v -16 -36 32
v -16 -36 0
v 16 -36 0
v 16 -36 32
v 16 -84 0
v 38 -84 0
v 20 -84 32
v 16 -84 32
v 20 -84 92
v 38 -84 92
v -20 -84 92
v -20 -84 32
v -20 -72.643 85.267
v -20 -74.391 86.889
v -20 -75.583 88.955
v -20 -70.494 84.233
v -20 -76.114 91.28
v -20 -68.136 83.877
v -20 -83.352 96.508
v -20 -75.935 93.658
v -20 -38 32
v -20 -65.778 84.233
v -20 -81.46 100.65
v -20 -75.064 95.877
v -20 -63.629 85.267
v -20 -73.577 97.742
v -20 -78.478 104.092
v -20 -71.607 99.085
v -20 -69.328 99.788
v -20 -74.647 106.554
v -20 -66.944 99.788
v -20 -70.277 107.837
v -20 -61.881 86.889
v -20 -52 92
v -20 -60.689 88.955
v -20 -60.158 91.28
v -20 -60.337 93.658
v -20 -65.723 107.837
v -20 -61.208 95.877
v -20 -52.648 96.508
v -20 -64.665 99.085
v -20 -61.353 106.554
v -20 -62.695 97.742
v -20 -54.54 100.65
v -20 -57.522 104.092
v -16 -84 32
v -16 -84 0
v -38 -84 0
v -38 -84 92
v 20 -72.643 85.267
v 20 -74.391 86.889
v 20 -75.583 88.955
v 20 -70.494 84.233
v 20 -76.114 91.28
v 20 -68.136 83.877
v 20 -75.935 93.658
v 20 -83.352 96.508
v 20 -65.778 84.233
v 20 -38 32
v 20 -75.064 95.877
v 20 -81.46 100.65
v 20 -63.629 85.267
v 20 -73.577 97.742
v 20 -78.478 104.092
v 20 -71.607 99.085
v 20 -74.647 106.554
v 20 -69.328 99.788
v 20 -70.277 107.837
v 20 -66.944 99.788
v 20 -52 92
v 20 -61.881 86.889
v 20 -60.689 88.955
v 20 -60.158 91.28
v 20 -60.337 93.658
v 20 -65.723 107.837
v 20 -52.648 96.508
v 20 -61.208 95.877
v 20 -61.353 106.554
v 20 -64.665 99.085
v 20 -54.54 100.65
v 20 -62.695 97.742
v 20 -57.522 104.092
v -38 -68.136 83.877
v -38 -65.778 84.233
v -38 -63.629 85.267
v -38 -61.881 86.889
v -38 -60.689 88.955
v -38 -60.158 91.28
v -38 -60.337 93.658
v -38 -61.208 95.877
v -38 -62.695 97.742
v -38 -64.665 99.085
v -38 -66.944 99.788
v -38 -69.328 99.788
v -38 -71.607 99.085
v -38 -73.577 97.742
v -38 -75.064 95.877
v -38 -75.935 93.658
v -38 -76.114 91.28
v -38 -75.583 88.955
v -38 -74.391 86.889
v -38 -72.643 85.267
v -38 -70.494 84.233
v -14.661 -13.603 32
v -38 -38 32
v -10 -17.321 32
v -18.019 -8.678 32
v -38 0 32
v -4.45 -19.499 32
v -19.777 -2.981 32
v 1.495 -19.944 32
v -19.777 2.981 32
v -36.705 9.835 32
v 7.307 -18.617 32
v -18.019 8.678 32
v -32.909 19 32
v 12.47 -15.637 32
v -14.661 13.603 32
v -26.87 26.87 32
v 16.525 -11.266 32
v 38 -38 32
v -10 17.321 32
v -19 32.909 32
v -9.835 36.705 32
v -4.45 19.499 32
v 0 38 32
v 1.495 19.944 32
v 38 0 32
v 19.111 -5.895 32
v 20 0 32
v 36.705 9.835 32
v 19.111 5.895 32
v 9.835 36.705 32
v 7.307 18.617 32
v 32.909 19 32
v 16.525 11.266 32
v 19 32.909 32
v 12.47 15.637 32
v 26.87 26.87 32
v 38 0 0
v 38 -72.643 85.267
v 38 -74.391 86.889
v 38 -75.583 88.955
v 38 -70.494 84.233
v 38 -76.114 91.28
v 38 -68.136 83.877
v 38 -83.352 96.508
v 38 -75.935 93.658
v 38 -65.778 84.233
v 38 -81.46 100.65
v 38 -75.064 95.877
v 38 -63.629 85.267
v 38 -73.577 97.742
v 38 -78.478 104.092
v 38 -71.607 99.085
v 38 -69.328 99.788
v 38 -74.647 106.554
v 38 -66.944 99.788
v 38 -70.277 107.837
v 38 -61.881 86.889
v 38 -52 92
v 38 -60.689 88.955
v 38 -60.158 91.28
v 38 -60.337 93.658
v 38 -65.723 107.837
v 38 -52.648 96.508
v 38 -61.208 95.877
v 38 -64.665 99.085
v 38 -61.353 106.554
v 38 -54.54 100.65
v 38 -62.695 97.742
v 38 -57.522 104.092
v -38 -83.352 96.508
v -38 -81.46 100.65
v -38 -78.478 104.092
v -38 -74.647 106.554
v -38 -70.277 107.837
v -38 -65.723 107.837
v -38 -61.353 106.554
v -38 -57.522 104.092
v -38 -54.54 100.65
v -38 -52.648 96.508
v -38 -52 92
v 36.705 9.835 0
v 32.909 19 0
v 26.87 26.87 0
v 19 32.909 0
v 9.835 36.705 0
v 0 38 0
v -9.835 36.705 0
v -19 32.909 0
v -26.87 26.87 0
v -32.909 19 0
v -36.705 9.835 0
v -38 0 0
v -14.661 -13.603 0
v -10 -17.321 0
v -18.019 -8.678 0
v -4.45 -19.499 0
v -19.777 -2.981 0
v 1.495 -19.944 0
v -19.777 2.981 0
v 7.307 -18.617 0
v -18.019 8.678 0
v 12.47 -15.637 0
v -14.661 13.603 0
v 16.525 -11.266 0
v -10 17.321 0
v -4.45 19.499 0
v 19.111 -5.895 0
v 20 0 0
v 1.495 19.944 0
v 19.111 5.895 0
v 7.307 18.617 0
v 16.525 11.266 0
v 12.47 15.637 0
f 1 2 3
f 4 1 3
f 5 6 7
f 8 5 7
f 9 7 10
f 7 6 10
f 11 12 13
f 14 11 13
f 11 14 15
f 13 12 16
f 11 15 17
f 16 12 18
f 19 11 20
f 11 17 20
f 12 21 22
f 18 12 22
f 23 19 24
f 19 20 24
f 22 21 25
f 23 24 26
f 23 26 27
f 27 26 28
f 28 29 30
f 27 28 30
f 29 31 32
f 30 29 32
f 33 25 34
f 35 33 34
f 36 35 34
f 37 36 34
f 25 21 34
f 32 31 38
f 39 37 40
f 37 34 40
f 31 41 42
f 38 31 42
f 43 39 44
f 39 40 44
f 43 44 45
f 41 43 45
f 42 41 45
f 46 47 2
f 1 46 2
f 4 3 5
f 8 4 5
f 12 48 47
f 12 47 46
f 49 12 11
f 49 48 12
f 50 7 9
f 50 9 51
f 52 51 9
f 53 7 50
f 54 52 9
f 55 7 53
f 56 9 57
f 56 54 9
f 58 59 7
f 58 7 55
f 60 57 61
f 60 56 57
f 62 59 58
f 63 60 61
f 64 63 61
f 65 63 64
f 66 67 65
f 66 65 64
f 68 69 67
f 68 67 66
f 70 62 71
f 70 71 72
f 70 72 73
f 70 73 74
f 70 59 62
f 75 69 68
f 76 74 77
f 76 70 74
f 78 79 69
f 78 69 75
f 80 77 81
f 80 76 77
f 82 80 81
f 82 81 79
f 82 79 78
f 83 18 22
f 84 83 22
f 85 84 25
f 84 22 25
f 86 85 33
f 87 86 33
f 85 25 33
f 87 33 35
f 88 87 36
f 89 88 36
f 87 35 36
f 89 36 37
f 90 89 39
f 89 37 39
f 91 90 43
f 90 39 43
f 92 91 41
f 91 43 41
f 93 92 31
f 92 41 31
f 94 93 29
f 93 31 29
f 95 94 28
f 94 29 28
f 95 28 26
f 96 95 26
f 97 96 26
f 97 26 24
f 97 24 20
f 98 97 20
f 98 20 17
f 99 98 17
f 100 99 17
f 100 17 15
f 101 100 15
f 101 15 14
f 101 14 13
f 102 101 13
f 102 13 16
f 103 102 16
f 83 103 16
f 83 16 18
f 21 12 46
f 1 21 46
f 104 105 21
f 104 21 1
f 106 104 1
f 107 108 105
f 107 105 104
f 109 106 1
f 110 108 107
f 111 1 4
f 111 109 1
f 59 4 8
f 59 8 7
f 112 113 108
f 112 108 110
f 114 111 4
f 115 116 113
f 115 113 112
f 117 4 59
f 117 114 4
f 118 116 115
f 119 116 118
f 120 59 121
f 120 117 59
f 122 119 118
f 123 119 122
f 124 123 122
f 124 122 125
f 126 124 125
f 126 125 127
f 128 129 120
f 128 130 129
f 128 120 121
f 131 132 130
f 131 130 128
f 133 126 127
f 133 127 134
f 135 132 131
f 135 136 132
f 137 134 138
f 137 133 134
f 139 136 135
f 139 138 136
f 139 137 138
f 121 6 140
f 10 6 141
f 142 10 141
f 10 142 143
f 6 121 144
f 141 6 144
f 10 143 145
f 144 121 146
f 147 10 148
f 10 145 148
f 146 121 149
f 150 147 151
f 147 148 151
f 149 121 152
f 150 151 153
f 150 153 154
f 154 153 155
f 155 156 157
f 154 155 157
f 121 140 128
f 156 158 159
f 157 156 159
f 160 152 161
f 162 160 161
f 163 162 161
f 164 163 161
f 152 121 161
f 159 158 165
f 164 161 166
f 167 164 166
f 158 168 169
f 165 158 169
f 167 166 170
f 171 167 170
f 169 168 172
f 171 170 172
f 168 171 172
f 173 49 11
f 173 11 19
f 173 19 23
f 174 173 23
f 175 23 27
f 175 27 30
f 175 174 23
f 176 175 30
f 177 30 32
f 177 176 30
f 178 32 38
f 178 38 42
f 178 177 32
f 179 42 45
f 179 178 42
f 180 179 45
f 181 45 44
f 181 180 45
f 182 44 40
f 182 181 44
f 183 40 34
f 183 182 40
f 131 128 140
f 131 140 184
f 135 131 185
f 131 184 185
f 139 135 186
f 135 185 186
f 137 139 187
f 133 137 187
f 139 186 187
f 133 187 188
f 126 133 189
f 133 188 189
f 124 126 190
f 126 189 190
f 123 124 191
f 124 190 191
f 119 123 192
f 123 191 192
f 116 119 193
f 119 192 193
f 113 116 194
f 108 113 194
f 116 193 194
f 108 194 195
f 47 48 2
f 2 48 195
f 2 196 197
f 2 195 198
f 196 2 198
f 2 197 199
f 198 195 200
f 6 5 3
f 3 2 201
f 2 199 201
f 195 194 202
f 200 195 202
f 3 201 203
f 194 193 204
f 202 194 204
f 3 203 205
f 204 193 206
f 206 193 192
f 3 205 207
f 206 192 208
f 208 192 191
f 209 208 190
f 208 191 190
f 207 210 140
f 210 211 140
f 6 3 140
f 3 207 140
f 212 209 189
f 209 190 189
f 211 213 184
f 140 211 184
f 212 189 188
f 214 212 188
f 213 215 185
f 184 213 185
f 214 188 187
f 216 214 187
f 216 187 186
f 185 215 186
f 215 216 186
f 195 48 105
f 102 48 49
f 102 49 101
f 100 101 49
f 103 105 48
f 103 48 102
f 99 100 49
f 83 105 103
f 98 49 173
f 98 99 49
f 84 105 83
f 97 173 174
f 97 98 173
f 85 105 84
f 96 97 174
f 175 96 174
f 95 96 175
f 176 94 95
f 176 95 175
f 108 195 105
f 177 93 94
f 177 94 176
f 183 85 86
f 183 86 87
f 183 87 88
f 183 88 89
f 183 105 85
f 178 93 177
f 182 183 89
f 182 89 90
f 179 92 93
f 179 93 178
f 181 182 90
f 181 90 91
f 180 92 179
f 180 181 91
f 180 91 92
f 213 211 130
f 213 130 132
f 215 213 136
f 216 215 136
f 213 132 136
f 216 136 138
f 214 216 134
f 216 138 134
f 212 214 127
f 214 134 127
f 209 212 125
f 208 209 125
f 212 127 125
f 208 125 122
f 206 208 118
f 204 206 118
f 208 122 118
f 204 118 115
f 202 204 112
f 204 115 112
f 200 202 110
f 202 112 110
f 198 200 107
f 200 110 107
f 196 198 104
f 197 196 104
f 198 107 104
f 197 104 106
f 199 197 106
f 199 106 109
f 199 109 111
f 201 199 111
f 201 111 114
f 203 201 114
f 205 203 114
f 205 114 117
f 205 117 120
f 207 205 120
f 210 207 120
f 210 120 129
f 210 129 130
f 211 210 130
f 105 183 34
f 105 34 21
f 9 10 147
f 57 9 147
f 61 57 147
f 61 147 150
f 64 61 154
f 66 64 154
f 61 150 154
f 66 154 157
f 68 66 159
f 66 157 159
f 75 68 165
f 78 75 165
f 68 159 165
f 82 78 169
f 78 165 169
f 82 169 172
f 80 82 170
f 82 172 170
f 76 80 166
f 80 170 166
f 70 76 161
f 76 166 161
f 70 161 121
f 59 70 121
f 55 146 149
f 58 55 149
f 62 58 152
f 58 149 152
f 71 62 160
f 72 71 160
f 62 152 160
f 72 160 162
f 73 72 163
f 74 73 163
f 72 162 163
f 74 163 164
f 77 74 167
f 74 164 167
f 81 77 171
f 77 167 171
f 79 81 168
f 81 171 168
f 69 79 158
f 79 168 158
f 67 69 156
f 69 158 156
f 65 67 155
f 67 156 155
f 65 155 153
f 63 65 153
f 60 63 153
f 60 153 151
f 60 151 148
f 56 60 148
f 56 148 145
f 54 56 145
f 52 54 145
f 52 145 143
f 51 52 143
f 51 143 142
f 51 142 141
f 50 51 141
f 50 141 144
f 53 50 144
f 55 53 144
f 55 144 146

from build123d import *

# Parameters (mm, degrees)
BOSS_EXTRUDE1_DEPTH    = 32
SKETCH2_R              = 20
CUT_EXTRUDE1_DEPTH     = 33
BOSS_EXTRUDE2_DEPTH    = 18
F_16_0MM_DOWEL_SLOT1_D = 16


with BuildPart() as part:
    # Sketch1 → Boss-Extrude1 (new body)
    with BuildSketch(Plane.XY):
        with BuildLine():
            Line((-38, 0), (-38, -84))
            Line((-38, -84), (-16, -84))
            Line((-16, -84), (-16, -36))
            Line((-16, -36), (16, -36))
            Line((16, -36), (16, -84))
            Line((16, -84), (38, -84))
            Line((38, -84), (38, 0))
            ThreePointArc((38, 0), (0, 38), (-38, 0))
        make_face()
    extrude(amount=BOSS_EXTRUDE1_DEPTH)

    # Sketch2 → Cut-Extrude1 (cut, through all)
    with BuildSketch(Plane.XY.offset(32)):
        Circle(SKETCH2_R)
    extrude(amount=-CUT_EXTRUDE1_DEPTH, mode=Mode.SUBTRACT)

    # Sketch3 → Boss-Extrude2 (add)
    with BuildSketch(Plane.ZY.offset(38)):
        with BuildLine():
            Line((32, -84), (92, -84))
            ThreePointArc((92, -84), (108, -68), (92, -52))
            Line((92, -52), (32, -38))
            Line((32, -38), (32, -84))
        make_face()
    boss_extrude2 = extrude(amount=-BOSS_EXTRUDE2_DEPTH)

    # Mirror1: Boss-Extrude2 across plane
    add(boss_extrude2.mirror(Plane(origin=(0, 0, 0), x_dir=(0, 0, 1), z_dir=(1, 0, 0))))

    # Ø16.0mm Dowel Slot1 (through all)
    with Locations(Plane.ZY.offset(38)):
        with Locations((91.877349946, -68.13604901)):
            Hole(F_16_0MM_DOWEL_SLOT1_D / 2)


solid = part.part
